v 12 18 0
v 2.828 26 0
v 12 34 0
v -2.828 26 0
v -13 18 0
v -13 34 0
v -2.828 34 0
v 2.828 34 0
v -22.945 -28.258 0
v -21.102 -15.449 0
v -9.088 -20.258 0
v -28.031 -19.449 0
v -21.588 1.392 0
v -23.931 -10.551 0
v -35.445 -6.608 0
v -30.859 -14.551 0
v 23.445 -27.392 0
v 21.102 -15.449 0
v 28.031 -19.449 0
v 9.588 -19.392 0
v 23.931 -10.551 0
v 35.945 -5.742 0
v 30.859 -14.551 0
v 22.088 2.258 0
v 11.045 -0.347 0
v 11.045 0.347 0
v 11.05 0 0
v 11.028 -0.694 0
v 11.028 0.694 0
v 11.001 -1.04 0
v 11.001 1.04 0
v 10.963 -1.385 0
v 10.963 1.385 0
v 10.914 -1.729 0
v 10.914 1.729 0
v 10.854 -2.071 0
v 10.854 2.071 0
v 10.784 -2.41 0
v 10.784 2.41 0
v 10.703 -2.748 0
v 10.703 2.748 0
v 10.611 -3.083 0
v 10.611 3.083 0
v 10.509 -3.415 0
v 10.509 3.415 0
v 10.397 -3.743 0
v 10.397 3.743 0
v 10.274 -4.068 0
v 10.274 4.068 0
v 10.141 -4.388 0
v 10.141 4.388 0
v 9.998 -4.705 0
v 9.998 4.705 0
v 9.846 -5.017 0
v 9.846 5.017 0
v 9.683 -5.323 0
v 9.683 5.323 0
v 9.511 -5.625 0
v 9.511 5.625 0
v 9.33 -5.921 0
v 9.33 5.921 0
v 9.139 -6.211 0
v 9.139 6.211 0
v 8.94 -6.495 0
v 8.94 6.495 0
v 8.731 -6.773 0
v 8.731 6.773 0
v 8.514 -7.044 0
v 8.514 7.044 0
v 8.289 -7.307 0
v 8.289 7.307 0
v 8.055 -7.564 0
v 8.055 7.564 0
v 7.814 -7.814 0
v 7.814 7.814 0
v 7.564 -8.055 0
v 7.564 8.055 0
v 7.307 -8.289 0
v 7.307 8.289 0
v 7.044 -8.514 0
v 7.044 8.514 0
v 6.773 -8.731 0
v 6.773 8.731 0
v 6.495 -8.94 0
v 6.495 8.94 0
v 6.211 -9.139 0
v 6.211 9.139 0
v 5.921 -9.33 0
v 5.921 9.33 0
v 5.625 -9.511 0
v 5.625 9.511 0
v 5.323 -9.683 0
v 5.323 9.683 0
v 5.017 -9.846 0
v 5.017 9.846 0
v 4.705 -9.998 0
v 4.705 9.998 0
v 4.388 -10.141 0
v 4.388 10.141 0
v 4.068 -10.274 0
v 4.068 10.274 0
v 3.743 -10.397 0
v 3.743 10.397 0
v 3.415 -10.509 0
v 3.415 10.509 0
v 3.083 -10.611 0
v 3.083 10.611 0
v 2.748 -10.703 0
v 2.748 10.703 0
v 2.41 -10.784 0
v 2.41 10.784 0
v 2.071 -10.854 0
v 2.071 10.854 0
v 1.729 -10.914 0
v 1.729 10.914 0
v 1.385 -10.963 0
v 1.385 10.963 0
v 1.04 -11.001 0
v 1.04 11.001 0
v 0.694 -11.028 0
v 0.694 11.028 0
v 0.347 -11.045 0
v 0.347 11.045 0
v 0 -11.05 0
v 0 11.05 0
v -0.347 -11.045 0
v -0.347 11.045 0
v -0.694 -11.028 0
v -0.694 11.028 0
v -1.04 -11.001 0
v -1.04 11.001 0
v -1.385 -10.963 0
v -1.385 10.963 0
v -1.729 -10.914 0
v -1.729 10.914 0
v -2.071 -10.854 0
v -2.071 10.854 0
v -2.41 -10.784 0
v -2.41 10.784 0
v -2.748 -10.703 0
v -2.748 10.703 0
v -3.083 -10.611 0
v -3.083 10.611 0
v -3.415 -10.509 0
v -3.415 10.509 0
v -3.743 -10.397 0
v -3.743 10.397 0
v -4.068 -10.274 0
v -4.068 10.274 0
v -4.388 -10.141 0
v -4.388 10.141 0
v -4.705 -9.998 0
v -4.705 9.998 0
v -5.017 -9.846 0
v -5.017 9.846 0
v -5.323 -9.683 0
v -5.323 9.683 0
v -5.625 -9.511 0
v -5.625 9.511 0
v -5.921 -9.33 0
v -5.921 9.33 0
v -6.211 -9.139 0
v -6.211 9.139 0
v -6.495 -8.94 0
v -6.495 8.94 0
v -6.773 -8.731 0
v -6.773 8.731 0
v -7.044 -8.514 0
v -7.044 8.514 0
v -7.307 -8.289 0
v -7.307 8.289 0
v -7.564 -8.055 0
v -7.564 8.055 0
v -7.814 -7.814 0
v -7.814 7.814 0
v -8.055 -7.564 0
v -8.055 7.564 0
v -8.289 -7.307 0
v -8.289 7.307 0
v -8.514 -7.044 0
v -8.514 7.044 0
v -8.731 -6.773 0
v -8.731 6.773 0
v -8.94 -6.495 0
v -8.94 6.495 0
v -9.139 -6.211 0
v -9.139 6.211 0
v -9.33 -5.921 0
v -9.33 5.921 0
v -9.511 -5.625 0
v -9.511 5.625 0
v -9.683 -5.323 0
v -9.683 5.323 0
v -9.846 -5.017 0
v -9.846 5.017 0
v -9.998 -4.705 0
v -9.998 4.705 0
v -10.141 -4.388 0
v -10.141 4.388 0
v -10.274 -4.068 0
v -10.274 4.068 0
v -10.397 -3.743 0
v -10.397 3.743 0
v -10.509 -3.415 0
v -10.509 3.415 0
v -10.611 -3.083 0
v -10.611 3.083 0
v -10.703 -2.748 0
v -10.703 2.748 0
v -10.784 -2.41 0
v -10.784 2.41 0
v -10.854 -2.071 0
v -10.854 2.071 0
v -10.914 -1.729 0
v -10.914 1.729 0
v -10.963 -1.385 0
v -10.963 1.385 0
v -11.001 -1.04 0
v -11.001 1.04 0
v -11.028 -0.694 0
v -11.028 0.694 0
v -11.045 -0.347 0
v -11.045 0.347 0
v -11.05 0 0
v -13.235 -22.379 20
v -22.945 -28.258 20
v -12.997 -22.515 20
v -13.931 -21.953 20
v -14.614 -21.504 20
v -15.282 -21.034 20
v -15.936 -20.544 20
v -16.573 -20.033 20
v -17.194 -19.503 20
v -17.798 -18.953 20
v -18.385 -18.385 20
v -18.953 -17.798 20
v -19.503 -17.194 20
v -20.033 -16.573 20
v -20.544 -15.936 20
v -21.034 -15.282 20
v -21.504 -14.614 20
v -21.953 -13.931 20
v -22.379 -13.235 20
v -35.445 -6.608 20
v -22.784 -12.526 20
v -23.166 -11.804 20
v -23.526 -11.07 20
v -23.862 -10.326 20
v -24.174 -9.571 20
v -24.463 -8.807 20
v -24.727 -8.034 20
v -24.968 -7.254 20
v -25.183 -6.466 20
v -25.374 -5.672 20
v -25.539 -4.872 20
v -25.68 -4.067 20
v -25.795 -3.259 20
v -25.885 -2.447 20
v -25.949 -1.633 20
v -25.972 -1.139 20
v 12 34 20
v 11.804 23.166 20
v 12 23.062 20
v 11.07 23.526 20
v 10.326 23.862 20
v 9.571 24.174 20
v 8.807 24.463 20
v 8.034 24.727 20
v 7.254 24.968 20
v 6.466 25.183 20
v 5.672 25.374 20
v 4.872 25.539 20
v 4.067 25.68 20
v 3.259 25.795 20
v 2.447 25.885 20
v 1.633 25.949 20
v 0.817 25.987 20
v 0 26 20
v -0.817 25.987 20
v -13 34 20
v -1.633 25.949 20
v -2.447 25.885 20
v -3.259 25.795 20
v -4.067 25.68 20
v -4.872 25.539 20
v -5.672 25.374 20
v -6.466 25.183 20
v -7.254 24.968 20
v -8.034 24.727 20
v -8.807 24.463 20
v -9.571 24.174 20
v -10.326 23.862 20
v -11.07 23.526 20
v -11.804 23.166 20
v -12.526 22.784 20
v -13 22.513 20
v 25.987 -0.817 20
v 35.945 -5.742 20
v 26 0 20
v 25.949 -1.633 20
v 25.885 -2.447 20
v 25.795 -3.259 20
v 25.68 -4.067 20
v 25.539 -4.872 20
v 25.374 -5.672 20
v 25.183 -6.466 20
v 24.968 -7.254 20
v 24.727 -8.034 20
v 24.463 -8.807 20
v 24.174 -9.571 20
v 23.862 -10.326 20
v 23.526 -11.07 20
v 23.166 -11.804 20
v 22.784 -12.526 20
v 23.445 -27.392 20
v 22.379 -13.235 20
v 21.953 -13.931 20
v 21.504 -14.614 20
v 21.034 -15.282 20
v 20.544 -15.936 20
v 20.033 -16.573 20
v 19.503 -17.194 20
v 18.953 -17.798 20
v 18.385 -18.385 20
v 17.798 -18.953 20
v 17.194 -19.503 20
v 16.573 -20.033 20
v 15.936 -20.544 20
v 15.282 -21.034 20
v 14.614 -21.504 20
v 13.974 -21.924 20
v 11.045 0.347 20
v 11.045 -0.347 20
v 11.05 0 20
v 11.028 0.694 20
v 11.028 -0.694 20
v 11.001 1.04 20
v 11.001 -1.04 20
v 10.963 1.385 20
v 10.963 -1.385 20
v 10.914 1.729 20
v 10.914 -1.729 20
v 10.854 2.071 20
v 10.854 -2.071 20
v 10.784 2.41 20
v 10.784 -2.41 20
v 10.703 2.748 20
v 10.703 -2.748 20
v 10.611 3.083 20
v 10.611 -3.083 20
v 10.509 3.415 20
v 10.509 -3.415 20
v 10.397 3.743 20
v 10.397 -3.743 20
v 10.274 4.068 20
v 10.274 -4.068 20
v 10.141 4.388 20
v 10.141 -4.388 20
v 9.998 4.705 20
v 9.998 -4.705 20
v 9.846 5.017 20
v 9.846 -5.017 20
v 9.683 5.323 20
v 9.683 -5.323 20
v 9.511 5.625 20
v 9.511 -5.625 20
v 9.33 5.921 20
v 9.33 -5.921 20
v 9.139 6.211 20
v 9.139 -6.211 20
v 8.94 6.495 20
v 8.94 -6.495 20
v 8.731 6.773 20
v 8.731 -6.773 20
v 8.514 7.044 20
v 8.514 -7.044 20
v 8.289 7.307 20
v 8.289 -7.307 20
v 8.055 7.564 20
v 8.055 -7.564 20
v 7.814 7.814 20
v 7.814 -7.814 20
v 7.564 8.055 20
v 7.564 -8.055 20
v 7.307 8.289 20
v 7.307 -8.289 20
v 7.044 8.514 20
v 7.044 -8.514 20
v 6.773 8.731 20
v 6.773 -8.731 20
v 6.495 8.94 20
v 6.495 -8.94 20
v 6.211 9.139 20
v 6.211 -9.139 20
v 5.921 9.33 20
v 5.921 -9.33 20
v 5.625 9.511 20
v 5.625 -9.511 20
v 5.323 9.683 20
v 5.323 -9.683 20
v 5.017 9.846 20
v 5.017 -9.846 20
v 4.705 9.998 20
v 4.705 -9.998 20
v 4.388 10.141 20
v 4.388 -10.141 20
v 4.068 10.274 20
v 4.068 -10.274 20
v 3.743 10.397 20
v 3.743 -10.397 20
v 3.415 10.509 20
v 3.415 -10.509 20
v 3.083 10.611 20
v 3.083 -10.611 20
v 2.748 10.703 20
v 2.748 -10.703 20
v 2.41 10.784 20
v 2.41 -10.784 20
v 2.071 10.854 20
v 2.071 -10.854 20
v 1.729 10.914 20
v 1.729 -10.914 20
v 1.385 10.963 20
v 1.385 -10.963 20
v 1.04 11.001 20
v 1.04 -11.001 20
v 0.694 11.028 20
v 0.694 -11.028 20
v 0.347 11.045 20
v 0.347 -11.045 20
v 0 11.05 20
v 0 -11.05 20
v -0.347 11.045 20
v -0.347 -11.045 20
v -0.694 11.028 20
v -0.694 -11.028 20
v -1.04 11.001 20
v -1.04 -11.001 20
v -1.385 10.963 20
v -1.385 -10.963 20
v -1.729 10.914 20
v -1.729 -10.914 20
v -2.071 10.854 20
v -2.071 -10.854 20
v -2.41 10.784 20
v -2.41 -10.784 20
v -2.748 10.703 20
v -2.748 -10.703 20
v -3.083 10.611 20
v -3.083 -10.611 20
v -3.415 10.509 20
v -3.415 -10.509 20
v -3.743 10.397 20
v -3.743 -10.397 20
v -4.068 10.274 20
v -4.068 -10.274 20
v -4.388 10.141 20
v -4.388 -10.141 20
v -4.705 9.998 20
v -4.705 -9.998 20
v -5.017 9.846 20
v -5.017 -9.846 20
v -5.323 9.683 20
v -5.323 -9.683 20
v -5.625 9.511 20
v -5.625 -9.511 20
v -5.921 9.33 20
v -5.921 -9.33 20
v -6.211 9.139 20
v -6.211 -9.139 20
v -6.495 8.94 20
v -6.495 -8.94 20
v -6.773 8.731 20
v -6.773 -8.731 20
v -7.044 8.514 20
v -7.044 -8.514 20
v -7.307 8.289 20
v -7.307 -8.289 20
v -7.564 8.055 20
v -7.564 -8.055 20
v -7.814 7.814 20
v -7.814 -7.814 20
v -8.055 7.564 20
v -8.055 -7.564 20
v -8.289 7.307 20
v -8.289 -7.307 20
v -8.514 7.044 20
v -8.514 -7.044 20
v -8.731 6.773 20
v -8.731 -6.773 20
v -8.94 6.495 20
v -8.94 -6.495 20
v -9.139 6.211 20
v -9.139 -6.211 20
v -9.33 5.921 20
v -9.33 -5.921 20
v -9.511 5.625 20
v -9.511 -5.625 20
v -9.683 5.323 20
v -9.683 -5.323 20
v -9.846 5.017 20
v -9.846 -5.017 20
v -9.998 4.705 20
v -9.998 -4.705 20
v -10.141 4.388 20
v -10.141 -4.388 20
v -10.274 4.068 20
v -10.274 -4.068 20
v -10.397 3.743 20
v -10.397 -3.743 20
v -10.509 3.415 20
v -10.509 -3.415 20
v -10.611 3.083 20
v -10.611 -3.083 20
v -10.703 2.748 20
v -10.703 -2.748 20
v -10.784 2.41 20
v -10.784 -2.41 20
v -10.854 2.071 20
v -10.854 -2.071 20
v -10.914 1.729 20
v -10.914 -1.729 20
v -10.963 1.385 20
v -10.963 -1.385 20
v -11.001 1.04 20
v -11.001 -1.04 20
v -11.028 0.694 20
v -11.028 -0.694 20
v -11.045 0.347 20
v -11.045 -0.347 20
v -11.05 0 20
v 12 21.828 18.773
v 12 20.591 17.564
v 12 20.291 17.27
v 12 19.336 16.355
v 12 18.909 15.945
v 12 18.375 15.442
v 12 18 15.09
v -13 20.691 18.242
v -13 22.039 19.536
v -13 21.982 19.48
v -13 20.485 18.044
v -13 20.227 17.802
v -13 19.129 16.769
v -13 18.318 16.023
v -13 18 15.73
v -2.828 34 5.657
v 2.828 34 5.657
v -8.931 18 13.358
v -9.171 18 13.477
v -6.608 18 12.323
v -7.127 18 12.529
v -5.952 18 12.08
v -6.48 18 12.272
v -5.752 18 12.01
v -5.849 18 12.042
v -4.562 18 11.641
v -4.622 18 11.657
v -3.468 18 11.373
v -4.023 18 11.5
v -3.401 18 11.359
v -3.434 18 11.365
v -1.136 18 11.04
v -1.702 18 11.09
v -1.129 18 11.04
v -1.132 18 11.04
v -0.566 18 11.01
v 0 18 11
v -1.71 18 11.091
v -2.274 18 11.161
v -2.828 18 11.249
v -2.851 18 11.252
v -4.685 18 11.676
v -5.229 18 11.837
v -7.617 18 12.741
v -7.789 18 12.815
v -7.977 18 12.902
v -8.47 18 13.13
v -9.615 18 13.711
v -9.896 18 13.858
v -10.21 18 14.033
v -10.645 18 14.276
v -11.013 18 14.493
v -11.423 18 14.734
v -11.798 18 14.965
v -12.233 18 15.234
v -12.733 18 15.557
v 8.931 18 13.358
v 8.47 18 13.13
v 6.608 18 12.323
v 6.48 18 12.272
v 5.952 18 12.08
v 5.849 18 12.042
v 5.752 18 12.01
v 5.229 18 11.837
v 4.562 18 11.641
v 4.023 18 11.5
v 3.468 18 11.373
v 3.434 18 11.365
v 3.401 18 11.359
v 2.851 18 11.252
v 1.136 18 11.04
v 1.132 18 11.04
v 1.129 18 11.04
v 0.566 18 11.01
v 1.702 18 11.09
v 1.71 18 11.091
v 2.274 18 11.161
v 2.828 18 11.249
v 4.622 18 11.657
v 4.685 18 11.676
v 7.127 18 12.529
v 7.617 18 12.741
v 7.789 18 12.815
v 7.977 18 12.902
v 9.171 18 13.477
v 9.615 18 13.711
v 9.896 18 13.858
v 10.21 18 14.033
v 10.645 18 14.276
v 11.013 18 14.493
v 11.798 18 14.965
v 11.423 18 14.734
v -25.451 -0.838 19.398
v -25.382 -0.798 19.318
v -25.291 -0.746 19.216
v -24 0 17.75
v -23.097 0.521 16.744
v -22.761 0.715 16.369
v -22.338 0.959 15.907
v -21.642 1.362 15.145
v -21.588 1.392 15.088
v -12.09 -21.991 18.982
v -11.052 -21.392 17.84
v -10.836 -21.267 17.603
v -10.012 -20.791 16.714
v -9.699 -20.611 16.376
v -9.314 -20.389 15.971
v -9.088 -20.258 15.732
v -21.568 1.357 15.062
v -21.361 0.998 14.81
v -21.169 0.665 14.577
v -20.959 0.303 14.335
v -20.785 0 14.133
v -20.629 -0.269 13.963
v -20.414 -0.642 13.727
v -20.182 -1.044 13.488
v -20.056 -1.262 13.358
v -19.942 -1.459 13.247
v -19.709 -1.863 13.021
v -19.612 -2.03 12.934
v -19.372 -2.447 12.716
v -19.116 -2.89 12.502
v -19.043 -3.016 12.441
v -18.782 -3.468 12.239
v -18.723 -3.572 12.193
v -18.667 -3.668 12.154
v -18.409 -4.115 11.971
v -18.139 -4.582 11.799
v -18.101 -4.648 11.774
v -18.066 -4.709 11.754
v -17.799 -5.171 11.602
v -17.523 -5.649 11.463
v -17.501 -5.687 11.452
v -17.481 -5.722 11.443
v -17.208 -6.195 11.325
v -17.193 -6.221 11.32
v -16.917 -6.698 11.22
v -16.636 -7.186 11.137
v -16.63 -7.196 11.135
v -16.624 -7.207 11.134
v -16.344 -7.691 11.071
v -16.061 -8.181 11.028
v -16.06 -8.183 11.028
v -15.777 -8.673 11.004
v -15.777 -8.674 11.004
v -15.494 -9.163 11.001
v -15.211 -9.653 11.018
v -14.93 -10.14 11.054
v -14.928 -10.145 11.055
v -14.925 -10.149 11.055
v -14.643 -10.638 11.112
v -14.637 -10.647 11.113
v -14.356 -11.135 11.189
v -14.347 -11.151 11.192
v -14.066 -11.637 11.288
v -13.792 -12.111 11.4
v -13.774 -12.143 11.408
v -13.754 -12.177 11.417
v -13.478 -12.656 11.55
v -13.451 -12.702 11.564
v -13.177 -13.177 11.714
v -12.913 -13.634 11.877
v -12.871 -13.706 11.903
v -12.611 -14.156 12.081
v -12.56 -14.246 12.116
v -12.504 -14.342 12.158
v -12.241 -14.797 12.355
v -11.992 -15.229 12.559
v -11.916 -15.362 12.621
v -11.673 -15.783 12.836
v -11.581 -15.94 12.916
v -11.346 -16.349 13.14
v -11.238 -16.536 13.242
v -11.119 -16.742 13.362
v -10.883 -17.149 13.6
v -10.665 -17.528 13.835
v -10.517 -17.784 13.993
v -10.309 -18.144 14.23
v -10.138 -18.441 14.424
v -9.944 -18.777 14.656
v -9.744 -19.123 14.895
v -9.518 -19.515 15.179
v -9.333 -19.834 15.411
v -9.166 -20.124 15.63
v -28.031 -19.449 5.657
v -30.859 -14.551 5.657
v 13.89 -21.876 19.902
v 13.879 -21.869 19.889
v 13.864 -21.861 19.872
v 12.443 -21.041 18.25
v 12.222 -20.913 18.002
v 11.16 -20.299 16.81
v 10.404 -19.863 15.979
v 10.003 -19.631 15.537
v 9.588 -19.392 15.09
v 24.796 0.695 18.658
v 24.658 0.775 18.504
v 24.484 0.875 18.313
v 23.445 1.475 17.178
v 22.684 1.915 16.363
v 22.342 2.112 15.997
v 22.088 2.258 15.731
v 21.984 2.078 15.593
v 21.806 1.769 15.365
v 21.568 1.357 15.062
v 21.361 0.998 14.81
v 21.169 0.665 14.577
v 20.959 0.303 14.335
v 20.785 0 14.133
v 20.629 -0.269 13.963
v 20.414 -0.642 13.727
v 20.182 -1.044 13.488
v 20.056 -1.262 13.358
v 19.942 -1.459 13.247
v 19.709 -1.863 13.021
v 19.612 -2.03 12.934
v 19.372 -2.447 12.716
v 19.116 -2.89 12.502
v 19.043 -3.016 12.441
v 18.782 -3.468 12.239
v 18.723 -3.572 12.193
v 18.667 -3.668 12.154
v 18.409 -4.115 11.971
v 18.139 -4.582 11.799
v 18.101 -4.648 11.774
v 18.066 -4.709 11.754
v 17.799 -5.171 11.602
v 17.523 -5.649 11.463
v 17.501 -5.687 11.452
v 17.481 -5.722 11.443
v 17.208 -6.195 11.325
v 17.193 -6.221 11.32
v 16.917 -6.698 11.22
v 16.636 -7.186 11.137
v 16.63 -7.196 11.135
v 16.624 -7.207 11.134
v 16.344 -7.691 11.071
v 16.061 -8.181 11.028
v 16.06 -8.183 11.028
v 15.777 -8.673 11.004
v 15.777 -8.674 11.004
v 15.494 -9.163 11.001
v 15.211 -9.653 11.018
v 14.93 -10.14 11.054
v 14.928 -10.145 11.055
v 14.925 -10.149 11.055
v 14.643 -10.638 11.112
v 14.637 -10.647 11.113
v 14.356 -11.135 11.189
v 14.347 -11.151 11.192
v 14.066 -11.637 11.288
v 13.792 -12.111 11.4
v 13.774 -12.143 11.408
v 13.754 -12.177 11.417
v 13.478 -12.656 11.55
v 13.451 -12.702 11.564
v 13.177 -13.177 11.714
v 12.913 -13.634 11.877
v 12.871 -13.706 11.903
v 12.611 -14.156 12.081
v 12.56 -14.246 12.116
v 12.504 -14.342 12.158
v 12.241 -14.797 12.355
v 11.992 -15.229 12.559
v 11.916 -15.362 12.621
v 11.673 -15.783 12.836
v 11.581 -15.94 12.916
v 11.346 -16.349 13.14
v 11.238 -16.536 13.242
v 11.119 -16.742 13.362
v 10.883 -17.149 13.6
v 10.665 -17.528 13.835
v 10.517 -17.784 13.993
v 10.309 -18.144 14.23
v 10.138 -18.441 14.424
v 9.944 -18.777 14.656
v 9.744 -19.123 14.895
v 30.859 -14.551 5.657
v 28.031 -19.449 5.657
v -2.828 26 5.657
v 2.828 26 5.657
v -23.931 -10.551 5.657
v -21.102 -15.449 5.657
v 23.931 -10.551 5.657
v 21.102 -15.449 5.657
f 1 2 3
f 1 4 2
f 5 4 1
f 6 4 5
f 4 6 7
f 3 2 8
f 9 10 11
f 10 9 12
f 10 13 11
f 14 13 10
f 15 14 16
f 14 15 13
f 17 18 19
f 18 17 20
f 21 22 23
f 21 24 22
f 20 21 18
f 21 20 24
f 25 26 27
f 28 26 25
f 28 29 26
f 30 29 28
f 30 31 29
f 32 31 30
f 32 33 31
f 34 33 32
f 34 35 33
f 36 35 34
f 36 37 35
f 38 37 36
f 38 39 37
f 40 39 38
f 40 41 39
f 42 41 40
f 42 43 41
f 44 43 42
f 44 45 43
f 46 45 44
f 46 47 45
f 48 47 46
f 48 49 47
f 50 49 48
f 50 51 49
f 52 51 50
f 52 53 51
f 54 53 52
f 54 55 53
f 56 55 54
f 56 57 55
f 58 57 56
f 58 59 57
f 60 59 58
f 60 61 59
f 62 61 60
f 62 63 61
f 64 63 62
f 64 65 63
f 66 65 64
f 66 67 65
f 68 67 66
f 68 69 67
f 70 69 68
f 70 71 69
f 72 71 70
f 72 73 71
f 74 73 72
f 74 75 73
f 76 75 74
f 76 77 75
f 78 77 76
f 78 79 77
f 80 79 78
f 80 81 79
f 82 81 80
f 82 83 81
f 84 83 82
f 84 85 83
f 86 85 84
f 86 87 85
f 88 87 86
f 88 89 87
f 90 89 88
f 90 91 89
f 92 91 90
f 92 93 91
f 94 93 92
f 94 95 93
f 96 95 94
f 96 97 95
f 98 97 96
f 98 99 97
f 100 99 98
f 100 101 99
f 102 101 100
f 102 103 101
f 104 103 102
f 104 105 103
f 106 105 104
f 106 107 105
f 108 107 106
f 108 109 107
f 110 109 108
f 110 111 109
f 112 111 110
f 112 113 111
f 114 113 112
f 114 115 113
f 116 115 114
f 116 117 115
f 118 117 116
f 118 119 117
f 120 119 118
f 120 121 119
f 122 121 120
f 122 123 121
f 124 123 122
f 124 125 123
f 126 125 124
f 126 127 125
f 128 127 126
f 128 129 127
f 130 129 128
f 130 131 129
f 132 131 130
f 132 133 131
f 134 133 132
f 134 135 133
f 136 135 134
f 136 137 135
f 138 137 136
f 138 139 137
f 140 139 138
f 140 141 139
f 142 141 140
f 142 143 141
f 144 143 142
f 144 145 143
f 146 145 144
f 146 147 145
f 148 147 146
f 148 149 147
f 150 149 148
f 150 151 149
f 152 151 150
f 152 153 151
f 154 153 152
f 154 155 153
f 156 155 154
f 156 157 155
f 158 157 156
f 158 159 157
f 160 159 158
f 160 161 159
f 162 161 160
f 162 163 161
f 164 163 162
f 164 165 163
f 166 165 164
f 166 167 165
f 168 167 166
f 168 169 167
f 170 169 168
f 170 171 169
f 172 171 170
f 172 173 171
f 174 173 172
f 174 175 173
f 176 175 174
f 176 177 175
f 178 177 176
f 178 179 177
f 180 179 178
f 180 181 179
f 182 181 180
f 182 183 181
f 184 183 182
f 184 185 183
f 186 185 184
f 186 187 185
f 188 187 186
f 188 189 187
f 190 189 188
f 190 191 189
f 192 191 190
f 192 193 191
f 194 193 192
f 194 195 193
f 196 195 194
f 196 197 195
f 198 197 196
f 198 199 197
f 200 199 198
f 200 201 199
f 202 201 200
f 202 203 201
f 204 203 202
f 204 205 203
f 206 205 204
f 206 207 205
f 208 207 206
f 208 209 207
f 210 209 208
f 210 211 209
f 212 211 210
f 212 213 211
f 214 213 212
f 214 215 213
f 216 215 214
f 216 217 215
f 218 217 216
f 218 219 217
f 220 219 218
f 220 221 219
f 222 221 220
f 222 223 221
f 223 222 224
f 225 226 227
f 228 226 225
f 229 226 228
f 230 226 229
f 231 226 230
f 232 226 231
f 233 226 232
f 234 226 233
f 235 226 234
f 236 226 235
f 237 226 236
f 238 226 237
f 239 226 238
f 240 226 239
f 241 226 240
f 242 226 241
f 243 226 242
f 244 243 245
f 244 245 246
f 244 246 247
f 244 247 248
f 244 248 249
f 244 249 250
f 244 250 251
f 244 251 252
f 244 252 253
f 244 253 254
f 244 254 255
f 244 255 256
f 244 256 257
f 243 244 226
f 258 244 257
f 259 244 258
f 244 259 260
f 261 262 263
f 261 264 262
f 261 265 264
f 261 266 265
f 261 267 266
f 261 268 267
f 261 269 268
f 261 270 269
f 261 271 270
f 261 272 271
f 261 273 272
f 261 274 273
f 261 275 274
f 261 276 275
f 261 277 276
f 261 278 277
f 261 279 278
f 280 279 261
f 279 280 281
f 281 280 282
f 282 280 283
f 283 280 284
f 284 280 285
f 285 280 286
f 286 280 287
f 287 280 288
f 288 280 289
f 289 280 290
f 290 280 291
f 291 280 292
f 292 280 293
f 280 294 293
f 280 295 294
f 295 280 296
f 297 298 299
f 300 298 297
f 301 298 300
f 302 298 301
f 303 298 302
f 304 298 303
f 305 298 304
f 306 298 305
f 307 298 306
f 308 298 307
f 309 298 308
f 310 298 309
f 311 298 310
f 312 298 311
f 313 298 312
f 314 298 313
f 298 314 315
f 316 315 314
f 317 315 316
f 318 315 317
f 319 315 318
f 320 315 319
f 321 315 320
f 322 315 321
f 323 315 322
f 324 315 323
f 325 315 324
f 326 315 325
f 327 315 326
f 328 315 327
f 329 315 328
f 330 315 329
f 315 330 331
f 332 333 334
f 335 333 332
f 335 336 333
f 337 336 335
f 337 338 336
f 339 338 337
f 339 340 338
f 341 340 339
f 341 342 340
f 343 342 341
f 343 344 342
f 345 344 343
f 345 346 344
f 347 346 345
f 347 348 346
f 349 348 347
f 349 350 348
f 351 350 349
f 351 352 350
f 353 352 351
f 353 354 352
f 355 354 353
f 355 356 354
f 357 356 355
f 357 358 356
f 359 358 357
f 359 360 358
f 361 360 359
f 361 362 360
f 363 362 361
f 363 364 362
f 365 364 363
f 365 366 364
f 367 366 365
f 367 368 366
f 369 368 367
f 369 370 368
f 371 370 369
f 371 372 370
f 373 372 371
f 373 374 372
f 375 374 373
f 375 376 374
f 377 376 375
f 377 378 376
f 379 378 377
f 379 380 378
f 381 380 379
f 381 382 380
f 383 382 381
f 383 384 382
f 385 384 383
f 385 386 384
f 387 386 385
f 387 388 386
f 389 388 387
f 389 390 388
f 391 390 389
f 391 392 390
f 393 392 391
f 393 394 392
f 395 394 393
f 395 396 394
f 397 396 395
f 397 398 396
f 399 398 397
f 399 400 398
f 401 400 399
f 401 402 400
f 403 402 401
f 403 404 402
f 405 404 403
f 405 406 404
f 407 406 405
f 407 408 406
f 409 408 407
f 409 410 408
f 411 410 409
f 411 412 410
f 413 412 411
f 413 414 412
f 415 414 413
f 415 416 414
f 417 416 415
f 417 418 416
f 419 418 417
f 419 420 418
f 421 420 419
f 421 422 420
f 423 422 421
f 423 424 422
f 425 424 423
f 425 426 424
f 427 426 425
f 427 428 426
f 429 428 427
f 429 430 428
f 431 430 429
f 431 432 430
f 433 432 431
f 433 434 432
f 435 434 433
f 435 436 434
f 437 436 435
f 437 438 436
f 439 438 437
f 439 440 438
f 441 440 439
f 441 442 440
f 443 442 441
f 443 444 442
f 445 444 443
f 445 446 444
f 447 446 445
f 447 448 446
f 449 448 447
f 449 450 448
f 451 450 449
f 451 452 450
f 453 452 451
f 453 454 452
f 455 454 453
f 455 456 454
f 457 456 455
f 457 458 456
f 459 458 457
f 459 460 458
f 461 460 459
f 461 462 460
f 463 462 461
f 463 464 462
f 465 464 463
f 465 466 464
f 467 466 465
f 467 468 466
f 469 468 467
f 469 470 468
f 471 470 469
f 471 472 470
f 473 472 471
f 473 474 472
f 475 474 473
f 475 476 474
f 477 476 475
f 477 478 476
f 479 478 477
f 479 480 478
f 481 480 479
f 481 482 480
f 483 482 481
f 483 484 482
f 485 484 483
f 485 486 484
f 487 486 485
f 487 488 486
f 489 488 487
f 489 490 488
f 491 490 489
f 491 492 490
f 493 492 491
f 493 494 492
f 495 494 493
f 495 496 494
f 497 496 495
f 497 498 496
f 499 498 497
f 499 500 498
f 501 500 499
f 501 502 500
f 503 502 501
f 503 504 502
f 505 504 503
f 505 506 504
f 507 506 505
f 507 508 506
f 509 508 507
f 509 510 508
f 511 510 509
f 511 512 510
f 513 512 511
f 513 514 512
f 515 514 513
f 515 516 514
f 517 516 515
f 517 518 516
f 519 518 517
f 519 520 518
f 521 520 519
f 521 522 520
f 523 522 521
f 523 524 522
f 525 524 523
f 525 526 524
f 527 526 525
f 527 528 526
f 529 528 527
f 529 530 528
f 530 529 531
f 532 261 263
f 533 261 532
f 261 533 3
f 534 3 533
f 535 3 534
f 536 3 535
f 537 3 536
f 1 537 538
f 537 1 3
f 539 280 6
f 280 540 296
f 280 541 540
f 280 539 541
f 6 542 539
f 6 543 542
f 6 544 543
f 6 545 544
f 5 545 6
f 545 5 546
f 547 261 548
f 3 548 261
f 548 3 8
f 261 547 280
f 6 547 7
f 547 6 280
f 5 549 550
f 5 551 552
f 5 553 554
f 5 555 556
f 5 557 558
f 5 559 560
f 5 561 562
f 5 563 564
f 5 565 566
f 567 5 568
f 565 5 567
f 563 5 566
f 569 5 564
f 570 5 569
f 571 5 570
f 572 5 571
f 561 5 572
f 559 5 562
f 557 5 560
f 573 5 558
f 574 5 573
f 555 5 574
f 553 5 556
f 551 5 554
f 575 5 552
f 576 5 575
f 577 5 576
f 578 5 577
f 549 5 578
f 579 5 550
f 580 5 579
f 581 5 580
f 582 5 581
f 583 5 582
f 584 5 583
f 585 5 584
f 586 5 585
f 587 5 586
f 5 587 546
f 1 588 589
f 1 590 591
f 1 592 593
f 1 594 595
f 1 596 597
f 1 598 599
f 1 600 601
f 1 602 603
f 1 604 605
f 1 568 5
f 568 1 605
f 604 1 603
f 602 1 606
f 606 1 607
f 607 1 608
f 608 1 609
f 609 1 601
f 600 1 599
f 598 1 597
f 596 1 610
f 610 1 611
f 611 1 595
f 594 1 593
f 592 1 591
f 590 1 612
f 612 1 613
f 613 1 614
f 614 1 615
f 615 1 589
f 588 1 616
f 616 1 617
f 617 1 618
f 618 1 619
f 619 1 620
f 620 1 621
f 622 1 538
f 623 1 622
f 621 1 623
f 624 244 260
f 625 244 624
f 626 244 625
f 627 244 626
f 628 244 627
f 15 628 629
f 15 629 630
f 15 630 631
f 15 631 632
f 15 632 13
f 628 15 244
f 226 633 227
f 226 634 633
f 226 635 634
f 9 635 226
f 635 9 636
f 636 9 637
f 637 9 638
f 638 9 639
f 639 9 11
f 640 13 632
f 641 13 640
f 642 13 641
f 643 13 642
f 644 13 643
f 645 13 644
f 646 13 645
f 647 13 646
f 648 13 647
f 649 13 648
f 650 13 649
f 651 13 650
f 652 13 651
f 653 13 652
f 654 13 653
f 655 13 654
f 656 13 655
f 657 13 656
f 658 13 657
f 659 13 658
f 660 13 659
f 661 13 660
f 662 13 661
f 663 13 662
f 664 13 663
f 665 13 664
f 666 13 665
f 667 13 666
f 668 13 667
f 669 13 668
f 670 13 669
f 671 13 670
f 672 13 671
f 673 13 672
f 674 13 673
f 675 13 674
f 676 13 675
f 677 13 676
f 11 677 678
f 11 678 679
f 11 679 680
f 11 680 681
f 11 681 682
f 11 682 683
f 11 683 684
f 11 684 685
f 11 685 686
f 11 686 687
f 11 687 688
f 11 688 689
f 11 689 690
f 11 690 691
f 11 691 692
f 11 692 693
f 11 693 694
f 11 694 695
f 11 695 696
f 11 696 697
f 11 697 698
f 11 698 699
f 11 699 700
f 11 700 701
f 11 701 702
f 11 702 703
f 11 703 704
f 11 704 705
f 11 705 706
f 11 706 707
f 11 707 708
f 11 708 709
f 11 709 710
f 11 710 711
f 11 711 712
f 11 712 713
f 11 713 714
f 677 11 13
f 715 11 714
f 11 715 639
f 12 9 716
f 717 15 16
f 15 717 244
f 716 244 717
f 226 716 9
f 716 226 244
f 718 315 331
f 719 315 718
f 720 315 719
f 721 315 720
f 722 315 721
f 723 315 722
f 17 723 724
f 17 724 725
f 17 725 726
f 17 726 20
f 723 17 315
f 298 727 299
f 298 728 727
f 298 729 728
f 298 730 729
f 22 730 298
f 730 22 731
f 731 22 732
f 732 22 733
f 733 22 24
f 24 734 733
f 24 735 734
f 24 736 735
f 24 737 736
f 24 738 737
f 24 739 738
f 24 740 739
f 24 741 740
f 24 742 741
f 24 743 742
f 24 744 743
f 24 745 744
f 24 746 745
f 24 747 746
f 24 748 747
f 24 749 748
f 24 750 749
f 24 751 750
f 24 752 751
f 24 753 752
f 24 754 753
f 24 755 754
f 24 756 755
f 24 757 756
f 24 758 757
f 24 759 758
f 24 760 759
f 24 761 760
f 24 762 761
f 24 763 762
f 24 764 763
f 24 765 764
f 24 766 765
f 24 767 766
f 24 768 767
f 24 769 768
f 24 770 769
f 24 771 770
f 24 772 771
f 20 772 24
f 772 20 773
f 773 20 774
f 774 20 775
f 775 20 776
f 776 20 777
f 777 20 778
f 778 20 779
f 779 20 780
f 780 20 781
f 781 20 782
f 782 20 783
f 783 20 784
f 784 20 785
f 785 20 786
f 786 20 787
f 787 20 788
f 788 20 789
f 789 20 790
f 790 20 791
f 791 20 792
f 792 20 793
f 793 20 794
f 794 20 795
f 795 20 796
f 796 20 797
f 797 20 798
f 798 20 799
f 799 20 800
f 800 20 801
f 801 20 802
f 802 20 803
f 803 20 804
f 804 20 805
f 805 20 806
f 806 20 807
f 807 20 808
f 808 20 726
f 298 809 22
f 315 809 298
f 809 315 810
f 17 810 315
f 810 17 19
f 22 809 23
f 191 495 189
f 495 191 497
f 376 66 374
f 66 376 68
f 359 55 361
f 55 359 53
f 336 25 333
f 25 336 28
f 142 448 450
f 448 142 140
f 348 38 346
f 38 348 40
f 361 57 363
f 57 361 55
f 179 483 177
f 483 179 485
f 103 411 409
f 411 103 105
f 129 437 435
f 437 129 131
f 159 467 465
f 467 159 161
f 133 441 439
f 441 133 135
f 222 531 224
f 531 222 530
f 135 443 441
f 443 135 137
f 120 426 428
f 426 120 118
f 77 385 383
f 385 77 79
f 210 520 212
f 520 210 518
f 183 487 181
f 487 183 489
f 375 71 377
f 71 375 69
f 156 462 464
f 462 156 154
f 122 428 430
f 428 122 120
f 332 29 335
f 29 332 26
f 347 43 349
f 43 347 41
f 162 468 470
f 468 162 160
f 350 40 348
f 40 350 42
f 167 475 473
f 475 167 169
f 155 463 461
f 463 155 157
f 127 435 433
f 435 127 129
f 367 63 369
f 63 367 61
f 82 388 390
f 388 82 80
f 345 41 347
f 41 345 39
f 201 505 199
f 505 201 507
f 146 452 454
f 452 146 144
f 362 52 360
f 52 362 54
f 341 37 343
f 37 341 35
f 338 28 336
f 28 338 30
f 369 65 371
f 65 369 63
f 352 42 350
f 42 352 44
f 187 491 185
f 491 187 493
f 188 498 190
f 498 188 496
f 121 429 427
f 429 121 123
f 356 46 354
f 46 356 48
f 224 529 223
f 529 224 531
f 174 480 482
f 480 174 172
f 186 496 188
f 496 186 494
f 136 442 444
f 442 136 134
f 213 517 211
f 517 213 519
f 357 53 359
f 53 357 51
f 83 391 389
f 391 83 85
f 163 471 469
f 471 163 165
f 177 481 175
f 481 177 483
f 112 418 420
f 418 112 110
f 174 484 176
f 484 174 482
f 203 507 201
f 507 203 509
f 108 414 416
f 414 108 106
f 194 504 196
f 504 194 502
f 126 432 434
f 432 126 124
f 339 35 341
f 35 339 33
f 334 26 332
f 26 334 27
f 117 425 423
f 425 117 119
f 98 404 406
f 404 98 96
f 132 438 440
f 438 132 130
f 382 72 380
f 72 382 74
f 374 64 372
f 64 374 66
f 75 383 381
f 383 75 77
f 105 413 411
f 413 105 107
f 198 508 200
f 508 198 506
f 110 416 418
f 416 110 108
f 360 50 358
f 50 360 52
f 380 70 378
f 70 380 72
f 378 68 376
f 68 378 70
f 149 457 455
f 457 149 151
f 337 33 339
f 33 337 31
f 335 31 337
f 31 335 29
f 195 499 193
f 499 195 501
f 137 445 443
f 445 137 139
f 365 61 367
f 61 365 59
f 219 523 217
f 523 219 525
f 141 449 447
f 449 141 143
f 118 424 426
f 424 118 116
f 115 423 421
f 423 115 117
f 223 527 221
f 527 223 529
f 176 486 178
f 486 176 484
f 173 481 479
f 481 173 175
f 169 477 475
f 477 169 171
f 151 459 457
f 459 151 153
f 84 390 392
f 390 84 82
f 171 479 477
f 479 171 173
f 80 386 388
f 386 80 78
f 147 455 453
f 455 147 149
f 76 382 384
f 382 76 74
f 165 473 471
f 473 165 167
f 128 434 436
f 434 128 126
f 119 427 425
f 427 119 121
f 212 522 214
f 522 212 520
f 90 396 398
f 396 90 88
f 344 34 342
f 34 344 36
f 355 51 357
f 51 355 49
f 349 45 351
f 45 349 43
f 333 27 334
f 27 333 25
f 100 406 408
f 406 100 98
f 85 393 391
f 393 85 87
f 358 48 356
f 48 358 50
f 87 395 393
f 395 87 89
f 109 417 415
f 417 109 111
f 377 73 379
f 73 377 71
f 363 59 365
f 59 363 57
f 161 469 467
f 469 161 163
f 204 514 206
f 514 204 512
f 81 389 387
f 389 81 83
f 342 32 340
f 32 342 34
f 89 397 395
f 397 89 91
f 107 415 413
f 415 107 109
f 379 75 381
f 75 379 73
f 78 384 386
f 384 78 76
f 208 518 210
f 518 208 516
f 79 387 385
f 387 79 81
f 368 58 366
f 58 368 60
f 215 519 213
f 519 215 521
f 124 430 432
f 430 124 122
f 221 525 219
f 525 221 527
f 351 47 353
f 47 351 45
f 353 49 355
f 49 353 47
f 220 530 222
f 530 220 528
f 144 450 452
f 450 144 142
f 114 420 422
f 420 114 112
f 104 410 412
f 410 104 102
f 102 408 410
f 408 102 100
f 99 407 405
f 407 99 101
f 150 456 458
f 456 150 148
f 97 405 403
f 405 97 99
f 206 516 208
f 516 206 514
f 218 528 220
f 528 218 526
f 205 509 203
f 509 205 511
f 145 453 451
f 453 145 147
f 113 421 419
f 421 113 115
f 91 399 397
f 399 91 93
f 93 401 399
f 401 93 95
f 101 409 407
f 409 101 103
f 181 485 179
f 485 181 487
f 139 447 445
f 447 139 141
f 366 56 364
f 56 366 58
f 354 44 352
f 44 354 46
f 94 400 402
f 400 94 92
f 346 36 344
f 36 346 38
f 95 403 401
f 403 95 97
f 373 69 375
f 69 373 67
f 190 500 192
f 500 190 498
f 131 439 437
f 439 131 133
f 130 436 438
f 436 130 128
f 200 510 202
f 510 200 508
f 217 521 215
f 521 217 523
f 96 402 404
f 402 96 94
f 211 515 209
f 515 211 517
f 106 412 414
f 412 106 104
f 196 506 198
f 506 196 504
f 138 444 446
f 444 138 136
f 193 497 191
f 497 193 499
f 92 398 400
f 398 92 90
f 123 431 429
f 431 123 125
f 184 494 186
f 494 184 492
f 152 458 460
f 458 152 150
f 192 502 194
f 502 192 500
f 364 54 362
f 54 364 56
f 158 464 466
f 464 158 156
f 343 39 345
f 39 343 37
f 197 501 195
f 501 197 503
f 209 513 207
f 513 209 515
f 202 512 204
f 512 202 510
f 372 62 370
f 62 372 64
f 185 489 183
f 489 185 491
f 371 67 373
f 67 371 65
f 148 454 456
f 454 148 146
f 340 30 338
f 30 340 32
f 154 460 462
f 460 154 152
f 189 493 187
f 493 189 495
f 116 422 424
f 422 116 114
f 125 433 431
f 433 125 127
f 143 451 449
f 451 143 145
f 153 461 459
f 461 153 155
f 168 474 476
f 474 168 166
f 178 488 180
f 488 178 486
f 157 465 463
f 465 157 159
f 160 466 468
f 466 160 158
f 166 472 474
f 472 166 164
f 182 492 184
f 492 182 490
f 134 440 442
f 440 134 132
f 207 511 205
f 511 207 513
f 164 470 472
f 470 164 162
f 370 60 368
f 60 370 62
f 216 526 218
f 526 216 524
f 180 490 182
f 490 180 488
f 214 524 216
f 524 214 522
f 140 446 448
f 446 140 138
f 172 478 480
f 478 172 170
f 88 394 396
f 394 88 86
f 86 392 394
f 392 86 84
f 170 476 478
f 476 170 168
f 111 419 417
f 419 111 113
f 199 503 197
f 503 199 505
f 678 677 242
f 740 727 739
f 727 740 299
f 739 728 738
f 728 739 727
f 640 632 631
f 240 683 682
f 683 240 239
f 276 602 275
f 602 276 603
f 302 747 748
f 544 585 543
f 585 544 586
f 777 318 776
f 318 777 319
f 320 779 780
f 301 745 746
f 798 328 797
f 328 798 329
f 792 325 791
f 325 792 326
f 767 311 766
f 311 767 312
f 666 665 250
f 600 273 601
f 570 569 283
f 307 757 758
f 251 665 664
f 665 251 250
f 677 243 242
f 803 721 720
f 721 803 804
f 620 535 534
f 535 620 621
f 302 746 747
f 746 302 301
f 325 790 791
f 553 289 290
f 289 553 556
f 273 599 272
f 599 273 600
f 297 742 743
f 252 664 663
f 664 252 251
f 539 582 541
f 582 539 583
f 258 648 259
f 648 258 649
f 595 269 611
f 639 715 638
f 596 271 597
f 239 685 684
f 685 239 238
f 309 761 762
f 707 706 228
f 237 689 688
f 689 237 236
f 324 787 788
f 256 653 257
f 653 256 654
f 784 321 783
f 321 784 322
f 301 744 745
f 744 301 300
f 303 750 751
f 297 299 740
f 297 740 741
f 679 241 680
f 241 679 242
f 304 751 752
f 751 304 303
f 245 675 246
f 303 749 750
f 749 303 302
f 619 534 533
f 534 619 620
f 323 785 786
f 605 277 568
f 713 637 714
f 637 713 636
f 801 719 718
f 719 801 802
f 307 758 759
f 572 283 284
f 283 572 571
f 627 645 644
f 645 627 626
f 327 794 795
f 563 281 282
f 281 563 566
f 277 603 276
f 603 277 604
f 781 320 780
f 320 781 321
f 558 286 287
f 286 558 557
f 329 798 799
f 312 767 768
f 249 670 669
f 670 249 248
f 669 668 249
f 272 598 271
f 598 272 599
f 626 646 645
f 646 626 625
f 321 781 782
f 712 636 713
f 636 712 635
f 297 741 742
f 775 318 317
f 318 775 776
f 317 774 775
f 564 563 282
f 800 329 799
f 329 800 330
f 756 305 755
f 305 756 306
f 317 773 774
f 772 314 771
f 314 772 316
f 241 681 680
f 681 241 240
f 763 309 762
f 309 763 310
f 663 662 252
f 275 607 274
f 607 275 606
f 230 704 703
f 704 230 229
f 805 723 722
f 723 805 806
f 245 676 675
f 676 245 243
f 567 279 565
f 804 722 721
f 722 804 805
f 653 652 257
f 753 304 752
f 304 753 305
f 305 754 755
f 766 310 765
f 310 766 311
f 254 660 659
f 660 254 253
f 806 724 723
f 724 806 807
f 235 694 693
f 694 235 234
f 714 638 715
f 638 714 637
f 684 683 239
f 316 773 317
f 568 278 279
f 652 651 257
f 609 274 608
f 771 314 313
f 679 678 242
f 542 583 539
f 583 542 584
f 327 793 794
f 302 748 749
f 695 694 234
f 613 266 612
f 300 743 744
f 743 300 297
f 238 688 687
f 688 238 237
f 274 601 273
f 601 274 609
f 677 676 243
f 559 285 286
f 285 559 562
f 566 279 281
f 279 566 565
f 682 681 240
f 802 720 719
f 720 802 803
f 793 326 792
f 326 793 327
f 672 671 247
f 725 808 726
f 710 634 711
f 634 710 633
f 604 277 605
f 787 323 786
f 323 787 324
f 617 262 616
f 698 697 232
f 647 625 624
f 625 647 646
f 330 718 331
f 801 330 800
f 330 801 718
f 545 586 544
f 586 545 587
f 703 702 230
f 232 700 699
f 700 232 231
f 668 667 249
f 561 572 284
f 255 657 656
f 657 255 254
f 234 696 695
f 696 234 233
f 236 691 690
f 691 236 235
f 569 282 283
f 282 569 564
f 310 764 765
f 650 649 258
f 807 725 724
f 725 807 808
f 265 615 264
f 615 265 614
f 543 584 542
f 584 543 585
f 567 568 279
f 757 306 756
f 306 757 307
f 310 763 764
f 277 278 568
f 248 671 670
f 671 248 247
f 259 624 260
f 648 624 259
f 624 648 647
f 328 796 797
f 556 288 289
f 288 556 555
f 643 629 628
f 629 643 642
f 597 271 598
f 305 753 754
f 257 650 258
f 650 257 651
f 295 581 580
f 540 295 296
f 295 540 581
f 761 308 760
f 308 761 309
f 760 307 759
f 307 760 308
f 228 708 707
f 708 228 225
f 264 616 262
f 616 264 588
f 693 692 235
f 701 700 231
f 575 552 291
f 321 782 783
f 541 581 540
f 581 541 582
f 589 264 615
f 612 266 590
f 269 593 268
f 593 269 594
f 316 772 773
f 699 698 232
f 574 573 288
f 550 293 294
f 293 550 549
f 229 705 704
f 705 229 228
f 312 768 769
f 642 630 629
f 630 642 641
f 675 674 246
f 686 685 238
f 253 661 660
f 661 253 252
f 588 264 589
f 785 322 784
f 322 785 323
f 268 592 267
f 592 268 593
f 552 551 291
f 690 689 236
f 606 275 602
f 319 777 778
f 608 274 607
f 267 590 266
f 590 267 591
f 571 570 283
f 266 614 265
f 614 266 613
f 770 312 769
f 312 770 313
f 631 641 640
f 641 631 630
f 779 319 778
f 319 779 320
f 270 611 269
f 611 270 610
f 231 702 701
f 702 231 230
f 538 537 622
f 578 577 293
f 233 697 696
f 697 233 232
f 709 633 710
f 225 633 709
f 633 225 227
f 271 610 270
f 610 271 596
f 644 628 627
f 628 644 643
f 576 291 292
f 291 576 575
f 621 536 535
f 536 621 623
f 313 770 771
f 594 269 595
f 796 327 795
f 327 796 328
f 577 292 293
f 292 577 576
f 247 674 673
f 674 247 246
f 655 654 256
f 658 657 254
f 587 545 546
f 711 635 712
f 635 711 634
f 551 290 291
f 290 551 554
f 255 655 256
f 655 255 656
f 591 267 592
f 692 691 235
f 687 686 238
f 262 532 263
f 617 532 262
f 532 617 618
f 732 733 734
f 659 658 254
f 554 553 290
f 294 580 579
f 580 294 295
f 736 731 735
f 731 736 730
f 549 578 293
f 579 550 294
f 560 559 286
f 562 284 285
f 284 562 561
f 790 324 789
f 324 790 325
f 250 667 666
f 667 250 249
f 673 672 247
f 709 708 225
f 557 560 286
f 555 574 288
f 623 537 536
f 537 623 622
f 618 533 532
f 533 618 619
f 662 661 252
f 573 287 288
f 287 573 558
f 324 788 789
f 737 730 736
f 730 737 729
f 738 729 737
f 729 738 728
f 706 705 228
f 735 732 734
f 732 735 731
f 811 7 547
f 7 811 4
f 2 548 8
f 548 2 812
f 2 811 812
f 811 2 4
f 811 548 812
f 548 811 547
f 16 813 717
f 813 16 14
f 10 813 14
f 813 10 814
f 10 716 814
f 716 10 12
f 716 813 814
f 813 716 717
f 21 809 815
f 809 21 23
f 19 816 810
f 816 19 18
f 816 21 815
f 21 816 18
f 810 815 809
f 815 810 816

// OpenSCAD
$fn = 200; // Set resolution

module Bearing() {
	difference(){
		cylinder(h = 7, r = 11);
		translate([0, 0, -1]){
			cylinder(h = 9, r = 4);
		}
	}
}

module Spool_Bearing(){
	union() {
		difference() {
			cylinder(h = 20, r = 40);			

			// Bearing holes
			rotate([0, 0, 0]) {
				translate([-13, 18, -5]) {
					cube([25, 16, 30]);
				}
			}
	
			rotate([0, 0, 120]) {
				translate([-13, 18, -5]) {
					cube([25, 16, 30]);
				}
			}
	
			rotate([0, 0, 240]) {
				translate([-13, 18, -5]) {
					cube([25, 16, 30]);
				}
			}
			
			// Vertical bearing
			translate([0, 0, -1]) {
				cylinder(h = 22, r = 11.05);
			}
		}
	
		// Bearing pins
		rotate([0, 0, 0]) {
			translate([-(sin(45) * 4), 38, 0]) {
				rotate([90, 0, 0]) {
					cube([sin(45) * 8, sin(45) * 8, 12]);
				}
			}
		}
	
		rotate([0, 0, 120]) {
			translate([-(sin(45) * 4), 38, 0]) {
				rotate([90, 0, 0]) {
					cube([sin(45) * 8, sin(45) * 8, 12]);
				}
			}
		}
	
		rotate([0, 0, 240]) {
			translate([-(sin(45) * 4), 38, 0]) {
				rotate([90, 0, 0]) {
					cube([sin(45) * 8, sin(45) * 8, 12]);
				}
			}
		}

		// Spool centering cylinder
		translate([0, 0, 20]) {
			difference() {
				cylinder(h = 10, r = 26);
				translate([0, 0, -1]) {
					cylinder(h = 12, r = 24);
				}
			}
			
		}

		// upper ring support
		translate([0, 0, 11]) {
			difference() {
				cylinder(h = 9, r1 = 18, r2 = 26);
				translate([0, 0, -1]){
					cylinder(h = 20, r = 12);
				}
			}
		}
	}
}

module Bearing_Holder(){
    difference(){
        cylinder(h = 20, r = 40);
        
        Spool_Bearing();
    }
}

Bearing_Holder();
